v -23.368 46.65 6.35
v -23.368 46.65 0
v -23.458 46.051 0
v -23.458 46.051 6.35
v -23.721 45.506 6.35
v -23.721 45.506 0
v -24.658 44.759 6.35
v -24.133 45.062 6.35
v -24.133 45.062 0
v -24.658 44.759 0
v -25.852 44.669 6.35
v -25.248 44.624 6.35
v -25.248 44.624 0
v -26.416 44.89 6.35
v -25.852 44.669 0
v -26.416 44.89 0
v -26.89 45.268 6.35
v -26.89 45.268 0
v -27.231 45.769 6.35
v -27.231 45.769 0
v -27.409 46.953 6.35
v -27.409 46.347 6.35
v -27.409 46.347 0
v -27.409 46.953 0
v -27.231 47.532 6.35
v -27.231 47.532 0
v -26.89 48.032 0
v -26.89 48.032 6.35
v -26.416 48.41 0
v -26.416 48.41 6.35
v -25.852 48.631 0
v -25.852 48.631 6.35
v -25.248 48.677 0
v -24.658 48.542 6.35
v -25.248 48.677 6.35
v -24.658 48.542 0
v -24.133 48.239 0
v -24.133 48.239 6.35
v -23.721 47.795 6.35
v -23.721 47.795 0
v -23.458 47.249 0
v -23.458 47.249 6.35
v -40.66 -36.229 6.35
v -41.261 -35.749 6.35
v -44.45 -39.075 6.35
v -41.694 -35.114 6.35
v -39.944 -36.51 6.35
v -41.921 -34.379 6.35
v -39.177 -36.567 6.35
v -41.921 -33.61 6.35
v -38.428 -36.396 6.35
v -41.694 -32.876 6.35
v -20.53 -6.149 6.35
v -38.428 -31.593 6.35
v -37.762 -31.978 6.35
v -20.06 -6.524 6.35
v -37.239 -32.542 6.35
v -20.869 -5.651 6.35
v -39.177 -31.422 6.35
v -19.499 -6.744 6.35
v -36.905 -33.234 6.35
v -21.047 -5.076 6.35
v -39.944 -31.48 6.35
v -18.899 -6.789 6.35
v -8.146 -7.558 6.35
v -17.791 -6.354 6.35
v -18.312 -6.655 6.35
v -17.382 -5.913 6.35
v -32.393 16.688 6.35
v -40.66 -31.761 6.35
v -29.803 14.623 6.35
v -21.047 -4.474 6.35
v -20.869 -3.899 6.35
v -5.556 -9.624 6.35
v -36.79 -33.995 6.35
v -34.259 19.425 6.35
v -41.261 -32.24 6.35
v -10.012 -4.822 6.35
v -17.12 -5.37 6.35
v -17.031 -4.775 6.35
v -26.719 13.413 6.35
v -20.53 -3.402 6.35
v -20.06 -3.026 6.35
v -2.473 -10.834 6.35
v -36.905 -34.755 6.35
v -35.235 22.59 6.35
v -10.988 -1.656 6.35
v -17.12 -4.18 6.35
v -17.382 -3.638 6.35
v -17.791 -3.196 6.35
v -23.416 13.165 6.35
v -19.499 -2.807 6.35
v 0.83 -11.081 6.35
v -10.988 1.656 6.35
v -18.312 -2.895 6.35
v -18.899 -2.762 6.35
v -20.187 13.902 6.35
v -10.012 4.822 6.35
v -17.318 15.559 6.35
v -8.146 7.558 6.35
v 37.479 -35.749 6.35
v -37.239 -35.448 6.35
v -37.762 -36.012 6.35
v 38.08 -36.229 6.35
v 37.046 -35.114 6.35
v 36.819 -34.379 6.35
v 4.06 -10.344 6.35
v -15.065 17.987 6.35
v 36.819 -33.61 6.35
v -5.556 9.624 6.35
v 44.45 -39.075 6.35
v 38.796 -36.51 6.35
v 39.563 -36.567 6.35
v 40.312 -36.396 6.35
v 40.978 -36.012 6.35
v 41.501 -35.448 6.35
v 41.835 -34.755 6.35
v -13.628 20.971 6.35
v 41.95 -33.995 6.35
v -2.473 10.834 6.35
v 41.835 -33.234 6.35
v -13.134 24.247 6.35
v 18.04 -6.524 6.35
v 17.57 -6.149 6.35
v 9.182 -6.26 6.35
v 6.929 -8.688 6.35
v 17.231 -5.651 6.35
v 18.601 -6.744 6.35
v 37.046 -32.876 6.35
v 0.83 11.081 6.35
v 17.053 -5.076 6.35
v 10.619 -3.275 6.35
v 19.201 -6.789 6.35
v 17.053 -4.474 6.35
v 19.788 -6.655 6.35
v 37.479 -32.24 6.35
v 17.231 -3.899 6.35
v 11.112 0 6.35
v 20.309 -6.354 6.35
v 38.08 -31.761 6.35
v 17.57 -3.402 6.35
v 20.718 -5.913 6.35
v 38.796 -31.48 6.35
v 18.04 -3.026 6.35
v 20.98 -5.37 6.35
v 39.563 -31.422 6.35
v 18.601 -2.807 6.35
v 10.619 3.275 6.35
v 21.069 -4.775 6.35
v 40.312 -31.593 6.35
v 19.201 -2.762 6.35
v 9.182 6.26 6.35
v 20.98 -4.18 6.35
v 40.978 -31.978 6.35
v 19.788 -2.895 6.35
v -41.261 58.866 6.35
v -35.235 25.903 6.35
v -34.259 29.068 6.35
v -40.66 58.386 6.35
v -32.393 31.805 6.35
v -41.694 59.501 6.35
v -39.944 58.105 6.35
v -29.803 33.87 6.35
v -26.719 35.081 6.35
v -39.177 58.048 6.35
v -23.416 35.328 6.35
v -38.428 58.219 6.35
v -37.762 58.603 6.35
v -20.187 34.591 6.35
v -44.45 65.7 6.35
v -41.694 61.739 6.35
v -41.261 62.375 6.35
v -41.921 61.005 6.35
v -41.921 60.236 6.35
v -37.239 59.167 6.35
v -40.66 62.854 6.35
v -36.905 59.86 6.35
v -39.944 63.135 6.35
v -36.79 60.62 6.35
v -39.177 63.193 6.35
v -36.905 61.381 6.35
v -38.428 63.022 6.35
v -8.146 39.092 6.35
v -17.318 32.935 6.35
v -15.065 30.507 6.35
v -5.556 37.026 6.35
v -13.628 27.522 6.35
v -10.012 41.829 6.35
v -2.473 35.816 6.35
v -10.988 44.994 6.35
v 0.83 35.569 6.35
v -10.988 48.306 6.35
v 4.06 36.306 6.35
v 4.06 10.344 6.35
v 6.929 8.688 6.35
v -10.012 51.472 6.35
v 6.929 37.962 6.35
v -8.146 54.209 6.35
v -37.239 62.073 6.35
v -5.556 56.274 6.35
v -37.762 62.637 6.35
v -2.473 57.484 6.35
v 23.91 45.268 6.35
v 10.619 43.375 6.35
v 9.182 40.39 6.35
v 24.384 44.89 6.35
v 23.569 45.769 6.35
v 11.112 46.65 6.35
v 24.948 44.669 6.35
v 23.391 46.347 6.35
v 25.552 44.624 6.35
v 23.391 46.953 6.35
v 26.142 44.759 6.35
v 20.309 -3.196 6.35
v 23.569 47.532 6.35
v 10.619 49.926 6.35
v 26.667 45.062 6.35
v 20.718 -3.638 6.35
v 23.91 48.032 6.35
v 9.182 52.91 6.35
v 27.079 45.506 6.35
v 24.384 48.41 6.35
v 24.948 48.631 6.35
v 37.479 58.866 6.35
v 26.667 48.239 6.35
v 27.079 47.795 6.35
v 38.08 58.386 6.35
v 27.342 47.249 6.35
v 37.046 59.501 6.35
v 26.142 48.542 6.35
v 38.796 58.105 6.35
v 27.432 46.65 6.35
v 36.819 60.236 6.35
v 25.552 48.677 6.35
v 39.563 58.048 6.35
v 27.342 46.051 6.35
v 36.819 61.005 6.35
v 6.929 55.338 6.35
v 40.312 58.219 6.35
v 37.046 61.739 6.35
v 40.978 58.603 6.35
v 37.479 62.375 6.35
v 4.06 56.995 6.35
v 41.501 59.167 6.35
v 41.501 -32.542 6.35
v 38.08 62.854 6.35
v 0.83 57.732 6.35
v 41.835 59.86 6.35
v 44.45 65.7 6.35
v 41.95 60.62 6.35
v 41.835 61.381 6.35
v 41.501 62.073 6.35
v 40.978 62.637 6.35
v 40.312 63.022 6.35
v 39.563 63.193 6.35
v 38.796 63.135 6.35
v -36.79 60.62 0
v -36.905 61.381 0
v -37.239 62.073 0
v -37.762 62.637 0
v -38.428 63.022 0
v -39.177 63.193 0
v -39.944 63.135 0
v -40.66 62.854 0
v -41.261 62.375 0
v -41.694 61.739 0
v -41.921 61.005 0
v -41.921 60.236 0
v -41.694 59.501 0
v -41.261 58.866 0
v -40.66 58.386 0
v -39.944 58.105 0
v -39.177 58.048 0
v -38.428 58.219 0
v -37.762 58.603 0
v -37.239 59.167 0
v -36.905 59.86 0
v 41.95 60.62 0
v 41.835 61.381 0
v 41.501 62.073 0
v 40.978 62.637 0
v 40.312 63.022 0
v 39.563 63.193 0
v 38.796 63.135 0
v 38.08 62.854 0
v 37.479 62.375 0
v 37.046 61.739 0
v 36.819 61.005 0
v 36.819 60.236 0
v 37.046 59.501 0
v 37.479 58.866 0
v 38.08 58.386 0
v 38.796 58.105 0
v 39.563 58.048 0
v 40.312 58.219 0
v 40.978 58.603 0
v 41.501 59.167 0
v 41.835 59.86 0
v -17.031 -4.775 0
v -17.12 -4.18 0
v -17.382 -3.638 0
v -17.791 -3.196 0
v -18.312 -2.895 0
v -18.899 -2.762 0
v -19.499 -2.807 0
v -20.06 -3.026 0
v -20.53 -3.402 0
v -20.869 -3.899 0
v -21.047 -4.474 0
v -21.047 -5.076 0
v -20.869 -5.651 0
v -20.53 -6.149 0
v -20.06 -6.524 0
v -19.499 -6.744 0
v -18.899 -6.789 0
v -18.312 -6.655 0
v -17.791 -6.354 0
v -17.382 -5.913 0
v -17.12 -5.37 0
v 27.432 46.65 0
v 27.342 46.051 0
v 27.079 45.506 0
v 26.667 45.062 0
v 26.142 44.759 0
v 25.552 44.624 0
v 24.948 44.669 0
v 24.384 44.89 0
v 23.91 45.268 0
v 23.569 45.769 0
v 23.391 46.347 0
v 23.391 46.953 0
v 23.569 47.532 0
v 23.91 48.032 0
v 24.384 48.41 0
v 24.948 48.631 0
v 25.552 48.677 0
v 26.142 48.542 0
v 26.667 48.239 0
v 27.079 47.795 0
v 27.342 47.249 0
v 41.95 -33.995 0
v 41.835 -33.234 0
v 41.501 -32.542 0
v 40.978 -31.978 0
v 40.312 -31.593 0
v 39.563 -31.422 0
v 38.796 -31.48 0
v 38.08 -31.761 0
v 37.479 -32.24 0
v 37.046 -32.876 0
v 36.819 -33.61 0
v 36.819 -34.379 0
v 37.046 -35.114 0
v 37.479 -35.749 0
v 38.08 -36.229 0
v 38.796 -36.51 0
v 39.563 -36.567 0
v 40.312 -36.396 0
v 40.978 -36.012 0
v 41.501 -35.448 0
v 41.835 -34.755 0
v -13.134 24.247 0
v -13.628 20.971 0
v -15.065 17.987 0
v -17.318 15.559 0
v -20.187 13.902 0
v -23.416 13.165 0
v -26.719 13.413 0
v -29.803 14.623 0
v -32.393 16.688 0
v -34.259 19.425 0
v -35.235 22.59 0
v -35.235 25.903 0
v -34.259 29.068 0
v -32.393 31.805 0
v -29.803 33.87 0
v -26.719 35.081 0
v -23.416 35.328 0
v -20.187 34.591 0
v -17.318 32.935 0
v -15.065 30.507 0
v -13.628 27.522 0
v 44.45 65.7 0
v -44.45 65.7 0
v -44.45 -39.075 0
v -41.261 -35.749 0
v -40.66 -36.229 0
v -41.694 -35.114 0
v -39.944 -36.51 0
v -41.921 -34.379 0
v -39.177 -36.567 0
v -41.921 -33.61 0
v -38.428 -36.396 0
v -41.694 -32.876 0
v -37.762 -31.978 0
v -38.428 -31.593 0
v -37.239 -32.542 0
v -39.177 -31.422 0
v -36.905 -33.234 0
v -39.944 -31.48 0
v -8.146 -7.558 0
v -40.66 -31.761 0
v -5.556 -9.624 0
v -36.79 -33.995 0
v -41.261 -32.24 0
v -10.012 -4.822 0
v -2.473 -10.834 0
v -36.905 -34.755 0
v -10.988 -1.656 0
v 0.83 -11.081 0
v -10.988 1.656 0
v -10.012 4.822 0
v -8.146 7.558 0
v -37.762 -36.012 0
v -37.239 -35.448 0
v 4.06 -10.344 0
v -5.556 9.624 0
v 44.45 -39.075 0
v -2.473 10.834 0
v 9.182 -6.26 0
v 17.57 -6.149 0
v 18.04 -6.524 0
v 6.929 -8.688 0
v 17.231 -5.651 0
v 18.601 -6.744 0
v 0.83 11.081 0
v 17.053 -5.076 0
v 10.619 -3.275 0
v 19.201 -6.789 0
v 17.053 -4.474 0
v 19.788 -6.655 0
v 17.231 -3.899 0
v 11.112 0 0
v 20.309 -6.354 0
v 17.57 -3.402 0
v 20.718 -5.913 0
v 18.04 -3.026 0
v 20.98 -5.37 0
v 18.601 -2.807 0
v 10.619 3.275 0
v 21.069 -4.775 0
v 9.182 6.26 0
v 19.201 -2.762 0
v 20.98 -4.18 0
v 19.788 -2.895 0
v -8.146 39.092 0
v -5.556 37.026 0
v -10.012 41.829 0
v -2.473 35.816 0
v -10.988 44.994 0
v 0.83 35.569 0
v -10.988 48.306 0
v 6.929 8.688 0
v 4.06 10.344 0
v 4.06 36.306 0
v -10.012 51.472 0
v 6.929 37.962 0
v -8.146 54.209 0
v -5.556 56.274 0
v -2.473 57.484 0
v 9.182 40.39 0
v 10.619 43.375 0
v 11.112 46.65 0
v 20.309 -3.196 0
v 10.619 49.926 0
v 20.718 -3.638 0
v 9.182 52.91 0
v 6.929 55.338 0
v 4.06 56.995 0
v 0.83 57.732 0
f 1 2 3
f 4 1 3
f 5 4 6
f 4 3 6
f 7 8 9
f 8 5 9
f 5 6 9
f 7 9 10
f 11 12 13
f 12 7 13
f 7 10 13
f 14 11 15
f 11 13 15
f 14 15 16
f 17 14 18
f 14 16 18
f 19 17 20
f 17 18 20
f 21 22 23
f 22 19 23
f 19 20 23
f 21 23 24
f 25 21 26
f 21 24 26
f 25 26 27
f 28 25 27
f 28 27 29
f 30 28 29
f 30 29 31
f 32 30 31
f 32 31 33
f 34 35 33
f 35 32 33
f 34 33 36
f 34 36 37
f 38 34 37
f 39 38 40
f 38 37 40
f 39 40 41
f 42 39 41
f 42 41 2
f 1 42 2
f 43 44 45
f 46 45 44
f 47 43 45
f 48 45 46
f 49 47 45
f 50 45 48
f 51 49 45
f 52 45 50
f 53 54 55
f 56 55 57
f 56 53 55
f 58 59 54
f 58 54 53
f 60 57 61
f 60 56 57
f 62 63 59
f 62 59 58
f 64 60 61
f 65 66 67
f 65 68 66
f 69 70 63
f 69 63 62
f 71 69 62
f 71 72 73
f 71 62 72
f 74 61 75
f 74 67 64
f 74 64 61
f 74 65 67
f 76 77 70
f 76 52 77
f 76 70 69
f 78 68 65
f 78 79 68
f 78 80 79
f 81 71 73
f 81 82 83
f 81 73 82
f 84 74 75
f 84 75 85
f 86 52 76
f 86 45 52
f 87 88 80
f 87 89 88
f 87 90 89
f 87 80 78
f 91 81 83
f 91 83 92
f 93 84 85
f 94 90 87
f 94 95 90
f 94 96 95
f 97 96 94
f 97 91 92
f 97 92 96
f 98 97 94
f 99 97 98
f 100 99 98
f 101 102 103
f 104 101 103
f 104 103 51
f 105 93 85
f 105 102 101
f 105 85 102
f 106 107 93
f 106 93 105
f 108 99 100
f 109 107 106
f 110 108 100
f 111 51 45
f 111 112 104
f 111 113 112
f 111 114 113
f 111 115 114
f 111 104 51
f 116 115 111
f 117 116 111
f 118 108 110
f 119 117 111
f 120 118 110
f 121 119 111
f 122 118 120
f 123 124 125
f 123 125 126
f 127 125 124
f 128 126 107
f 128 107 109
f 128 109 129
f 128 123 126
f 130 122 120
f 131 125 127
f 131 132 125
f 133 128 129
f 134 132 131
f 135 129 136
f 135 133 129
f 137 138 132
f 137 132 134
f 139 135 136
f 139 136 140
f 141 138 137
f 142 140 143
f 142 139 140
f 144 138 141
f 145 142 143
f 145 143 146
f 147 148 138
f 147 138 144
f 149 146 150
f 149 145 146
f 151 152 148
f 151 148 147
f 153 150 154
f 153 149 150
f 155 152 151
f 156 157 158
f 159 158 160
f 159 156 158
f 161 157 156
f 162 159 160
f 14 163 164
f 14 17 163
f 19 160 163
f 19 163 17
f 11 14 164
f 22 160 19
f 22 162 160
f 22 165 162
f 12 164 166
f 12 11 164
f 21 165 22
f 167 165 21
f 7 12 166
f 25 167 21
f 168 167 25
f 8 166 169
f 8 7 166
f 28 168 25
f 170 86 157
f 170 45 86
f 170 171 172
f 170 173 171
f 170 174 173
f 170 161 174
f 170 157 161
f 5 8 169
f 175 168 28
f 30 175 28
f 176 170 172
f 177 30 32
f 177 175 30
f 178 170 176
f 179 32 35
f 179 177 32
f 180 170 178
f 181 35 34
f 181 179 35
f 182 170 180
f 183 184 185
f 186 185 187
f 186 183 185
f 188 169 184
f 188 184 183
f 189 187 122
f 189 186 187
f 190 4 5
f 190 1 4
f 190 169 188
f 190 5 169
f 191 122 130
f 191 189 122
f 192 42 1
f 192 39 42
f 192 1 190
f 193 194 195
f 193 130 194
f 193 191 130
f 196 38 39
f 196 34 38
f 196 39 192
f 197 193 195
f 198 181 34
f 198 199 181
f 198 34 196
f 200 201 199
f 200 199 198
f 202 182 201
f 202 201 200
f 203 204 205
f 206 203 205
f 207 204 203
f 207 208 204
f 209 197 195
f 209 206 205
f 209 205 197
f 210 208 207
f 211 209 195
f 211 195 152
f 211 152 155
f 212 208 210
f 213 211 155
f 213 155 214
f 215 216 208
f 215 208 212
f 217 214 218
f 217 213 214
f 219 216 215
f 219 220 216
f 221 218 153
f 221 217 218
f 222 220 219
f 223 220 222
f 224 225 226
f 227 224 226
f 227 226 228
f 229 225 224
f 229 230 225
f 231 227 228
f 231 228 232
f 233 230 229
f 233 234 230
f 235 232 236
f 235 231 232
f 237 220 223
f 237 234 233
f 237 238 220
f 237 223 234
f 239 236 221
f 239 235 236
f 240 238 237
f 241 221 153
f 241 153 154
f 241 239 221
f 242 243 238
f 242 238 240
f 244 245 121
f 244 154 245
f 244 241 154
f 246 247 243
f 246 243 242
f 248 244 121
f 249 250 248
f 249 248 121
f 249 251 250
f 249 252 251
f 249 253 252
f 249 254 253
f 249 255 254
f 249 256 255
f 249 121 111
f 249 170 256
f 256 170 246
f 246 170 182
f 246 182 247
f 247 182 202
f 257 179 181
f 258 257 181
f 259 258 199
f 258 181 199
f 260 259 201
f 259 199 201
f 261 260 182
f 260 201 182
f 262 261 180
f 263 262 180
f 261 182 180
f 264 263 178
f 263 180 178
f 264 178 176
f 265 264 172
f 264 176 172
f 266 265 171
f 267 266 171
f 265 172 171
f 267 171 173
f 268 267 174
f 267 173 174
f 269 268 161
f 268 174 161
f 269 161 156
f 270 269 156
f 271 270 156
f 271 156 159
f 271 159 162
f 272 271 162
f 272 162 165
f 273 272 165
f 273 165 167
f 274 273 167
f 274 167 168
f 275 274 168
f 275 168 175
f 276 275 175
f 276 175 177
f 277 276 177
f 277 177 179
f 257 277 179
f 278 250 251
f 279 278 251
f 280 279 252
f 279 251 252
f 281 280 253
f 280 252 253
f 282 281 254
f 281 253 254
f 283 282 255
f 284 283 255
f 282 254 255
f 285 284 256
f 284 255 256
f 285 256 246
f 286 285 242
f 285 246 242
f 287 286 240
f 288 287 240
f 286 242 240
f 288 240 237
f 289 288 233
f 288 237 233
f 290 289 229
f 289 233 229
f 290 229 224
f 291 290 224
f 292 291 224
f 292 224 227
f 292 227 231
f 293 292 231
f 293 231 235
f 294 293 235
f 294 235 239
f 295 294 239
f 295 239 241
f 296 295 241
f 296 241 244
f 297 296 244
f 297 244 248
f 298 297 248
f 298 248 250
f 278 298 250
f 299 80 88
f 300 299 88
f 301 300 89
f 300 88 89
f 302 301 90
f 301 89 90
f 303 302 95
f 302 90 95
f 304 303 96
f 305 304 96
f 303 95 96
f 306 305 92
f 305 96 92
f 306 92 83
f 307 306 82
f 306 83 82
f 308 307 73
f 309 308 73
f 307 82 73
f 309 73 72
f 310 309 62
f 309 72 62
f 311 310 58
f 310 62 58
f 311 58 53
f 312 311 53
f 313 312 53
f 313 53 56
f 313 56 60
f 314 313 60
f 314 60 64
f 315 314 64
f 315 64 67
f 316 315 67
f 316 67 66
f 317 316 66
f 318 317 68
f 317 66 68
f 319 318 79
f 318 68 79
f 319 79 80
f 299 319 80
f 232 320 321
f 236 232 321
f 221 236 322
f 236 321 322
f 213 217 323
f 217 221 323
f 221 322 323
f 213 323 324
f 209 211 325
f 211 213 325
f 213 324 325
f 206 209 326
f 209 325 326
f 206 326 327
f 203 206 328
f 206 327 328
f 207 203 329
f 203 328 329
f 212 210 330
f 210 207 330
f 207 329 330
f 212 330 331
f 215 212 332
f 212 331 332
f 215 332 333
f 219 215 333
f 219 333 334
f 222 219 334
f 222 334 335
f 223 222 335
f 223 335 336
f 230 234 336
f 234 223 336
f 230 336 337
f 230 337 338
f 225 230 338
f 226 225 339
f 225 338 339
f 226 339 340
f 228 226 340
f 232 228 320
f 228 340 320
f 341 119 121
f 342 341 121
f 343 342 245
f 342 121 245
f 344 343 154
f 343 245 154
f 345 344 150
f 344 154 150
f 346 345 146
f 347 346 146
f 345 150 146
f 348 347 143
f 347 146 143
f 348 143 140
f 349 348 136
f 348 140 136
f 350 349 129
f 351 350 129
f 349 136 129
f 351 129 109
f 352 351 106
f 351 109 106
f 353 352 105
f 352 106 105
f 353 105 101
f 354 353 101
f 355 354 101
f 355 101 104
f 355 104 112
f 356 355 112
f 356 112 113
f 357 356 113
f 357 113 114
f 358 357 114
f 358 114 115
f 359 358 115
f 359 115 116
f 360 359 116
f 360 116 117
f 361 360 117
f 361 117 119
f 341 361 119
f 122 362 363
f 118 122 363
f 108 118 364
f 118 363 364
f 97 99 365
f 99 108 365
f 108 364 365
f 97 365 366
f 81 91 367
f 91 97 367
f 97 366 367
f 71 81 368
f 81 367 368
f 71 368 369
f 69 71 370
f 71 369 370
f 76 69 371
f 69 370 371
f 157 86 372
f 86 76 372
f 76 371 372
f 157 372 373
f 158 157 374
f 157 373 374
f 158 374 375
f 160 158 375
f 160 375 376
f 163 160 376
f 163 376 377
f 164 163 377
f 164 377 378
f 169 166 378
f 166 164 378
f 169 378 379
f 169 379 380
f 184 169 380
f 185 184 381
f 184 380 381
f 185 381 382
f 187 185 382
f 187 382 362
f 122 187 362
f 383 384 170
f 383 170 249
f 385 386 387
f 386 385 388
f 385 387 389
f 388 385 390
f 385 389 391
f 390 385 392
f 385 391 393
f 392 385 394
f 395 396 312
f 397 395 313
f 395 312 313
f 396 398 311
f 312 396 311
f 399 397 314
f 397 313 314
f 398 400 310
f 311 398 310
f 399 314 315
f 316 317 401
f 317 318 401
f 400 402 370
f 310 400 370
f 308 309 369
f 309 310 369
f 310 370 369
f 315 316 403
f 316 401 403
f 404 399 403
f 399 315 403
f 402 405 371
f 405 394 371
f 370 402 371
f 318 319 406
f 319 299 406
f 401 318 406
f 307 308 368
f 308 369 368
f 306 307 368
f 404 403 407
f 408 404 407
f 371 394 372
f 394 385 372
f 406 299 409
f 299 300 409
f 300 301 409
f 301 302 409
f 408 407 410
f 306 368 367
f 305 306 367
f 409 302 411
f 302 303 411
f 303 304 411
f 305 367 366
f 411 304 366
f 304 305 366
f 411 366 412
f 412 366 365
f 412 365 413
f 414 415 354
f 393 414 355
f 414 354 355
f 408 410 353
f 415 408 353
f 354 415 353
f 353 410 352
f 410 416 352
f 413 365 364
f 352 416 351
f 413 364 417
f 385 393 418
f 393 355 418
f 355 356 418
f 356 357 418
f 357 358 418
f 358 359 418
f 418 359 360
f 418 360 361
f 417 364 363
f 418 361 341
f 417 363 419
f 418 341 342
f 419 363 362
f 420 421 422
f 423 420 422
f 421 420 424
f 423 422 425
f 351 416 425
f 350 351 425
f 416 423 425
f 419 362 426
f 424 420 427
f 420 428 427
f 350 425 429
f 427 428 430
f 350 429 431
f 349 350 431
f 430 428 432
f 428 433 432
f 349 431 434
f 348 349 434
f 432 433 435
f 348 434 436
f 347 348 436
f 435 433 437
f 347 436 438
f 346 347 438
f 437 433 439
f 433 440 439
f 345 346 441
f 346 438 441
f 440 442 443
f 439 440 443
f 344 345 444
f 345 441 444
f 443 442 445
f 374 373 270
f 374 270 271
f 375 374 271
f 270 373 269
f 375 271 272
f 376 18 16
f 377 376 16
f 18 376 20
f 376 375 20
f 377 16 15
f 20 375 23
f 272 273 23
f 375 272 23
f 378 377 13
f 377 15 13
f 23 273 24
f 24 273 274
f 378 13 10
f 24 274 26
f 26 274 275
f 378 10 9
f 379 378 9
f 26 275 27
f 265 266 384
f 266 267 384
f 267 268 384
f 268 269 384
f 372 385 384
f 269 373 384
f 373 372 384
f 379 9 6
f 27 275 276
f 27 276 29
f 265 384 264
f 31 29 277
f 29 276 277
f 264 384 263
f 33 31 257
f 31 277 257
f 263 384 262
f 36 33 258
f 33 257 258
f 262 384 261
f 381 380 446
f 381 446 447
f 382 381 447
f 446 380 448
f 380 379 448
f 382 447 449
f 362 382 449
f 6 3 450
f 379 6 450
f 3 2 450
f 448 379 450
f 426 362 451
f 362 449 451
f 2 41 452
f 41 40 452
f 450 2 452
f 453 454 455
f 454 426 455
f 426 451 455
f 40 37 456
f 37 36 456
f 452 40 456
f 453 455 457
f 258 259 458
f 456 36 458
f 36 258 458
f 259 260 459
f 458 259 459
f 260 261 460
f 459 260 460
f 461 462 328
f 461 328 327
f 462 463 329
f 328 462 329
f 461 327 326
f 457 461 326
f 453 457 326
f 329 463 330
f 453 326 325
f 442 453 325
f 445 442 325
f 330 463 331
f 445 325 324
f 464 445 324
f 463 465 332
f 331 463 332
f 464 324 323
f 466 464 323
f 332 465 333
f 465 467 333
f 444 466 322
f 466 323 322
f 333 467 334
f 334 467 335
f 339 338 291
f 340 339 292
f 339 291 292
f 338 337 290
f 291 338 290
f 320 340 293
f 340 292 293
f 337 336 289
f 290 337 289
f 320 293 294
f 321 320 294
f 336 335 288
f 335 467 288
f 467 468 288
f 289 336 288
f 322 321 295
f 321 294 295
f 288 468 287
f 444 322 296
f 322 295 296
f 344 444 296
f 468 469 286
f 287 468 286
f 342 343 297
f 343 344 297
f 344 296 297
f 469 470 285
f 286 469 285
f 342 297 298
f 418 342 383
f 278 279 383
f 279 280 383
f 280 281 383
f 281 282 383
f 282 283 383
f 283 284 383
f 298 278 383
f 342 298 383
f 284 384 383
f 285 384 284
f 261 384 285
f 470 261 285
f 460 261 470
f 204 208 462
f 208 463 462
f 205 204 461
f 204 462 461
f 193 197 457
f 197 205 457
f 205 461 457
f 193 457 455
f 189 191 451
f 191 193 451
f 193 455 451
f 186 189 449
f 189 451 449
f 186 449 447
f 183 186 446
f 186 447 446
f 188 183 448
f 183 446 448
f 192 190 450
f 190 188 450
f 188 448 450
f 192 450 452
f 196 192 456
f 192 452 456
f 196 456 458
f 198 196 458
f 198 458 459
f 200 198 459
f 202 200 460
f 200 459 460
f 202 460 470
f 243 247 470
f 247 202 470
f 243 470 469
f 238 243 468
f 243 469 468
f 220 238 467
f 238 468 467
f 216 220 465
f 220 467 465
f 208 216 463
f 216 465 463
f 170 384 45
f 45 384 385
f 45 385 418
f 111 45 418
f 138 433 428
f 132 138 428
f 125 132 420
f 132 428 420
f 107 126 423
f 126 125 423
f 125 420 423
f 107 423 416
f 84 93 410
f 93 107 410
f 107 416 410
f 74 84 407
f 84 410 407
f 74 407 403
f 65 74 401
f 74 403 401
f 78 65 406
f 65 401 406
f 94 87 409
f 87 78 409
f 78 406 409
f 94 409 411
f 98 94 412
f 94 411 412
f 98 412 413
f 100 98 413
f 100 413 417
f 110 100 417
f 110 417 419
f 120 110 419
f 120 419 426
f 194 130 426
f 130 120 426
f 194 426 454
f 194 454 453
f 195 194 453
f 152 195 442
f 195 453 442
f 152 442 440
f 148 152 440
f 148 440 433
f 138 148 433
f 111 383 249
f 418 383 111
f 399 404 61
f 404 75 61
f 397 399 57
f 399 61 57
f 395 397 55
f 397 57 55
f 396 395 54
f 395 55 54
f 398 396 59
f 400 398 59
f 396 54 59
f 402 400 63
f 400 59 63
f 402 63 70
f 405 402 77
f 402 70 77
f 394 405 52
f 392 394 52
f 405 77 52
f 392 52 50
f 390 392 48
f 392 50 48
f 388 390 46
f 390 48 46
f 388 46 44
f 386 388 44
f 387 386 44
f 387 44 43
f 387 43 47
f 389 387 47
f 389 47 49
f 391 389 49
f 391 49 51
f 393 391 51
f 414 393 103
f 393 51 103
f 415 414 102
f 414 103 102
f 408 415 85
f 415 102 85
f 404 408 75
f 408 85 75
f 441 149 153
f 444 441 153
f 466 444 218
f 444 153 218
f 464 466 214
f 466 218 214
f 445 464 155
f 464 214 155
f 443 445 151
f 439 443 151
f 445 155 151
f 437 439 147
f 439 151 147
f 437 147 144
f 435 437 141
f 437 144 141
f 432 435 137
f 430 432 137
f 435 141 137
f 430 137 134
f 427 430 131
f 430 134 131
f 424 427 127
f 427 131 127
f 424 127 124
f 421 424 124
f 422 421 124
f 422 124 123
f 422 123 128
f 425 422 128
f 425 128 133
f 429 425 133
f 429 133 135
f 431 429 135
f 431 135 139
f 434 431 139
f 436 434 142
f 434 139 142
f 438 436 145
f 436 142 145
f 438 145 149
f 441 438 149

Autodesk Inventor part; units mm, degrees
ref_plane "YZ Plane" through (0, 0, 0) normal (1, 0, 0) x (0, 1, 0)
ref_plane "XZ Plane" through (0, 0, 0) normal (0, 1, 0) x (-1, 0, 0)
ref_plane "XY Plane" through (0, 0, 0) normal (0, 0, 1) x (1, 0, 0)
sketch "Sketch1" plane through (0, 0, 0) normal (0, 0, 1) x (1, 0, 0)
  circle A0 centre (0, 0) radius 11.1125
  line L0 (0, 0) -> (-24.2467, 24.2467) construction
  line L1 (0, 0) -> (34.29, 0) construction
  circle A1 centre (-24.2467, 24.2467) radius 11.1125
  line L2 (-24.2467, 24.2467) -> (8.7733, 24.2467) construction
  line L3 (-24.2467, 24.2467) -> (0, 24.2467) construction
  line L4 (0, 24.2467) -> (0, 46.6502) construction
  line L5 (0, 46.6502) -> (-24.2467, 24.2467) construction
  circle A2 centre (0, 46.6502) radius 11.1125
  line L6 (0, 46.6502) -> (-25.4, 46.6502) construction
  line L7 (-25.4, 46.6502) -> (25.4, 46.6502) construction
  circle A3 centre (-25.4, 46.6502) radius 2.032
  circle A4 centre (25.4, 46.6502) radius 2.032
  line L8 (0, 46.6502) -> (0, 65.7002) construction
  line L9 (0, 65.7002) -> (44.45, 65.7002)
  line L10 (44.45, 65.7002) -> (44.45, -39.0748)
  line L11 (0, 65.7002) -> (-44.45, 65.7002)
  line L12 (-44.45, 65.7002) -> (-44.45, -39.0748)
  line L13 (-44.45, -39.0748) -> (44.45, -39.0748)
  dimension "d0" = 22.225
  dimension "d1" = 34.29
  dimension "d2" = 135
  dimension "d3" = 22.225
  dimension "d7" = 22.4035
  dimension "d8" = 22.225
  dimension "d9" = 25.4
  dimension "d10" = 50.8
  dimension "d11" = 4.064
  dimension "d12" = 19.05
  dimension "d13" = 104.775
  dimension "d14" = 44.45
  dimension "d17" = 44.45
extrude "Extrusion1" add sketch "Sketch1" along normal blind 6.35
sketch "Sketch2" plane through (0, 0, 6.35) normal (0, 0, 1) x (1, 0, 0)
  line L0 (-44.45, 65.7002) -> (-39.37, 65.7002) construction
  line L1 (-44.45, 65.7002) -> (44.45, 65.7002) construction
  line L2 (-39.37, 65.7002) -> (-39.37, 60.6202) construction
  circle A0 centre (-39.37, 60.6202) radius 2.5797
  line L3 (0, 65.7002) -> (0, -39.0748) construction
  line L4 (-44.45, -39.0748) -> (44.45, -39.0748) construction
  line L5 (44.45, -39.0748) -> (44.45, 65.7002) construction
  line L6 (44.45, 13.3127) -> (-44.45, 13.3127) construction
  circle A1 centre (39.37, 60.6202) radius 2.5797
  circle A2 centre (-39.37, -33.9948) radius 2.5797
  circle A3 centre (39.37, -33.9948) radius 2.5797
  point P0 (0, 0)
  dimension "d18" = 5.08
  dimension "d19" = 5.08
  dimension "d20" = 5.1594
extrude "Extrusion2" cut sketch "Sketch2" against normal blind 25.4
sketch "Sketch3" plane through (0, 0, 6.35) normal (0, 0, 1) x (1, 0, 0)
  line L0 (0, 0) -> (19.05, 0) construction
  line L1 (19.05, 0) -> (19.05, -4.7752) construction
  line L2 (0, 0) -> (0, -18.8827) construction
  circle A0 centre (19.05, -4.7752) radius 2.0193
  circle A1 centre (-19.05, -4.7752) radius 2.0193
  dimension "d23" = 19.05
  dimension "d24" = 4.7752
  dimension "d25" = 4.0386
extrude "Extrusion3" cut sketch "Sketch3" against normal blind 25.4
properties part number "Gearbox Plate V2"
